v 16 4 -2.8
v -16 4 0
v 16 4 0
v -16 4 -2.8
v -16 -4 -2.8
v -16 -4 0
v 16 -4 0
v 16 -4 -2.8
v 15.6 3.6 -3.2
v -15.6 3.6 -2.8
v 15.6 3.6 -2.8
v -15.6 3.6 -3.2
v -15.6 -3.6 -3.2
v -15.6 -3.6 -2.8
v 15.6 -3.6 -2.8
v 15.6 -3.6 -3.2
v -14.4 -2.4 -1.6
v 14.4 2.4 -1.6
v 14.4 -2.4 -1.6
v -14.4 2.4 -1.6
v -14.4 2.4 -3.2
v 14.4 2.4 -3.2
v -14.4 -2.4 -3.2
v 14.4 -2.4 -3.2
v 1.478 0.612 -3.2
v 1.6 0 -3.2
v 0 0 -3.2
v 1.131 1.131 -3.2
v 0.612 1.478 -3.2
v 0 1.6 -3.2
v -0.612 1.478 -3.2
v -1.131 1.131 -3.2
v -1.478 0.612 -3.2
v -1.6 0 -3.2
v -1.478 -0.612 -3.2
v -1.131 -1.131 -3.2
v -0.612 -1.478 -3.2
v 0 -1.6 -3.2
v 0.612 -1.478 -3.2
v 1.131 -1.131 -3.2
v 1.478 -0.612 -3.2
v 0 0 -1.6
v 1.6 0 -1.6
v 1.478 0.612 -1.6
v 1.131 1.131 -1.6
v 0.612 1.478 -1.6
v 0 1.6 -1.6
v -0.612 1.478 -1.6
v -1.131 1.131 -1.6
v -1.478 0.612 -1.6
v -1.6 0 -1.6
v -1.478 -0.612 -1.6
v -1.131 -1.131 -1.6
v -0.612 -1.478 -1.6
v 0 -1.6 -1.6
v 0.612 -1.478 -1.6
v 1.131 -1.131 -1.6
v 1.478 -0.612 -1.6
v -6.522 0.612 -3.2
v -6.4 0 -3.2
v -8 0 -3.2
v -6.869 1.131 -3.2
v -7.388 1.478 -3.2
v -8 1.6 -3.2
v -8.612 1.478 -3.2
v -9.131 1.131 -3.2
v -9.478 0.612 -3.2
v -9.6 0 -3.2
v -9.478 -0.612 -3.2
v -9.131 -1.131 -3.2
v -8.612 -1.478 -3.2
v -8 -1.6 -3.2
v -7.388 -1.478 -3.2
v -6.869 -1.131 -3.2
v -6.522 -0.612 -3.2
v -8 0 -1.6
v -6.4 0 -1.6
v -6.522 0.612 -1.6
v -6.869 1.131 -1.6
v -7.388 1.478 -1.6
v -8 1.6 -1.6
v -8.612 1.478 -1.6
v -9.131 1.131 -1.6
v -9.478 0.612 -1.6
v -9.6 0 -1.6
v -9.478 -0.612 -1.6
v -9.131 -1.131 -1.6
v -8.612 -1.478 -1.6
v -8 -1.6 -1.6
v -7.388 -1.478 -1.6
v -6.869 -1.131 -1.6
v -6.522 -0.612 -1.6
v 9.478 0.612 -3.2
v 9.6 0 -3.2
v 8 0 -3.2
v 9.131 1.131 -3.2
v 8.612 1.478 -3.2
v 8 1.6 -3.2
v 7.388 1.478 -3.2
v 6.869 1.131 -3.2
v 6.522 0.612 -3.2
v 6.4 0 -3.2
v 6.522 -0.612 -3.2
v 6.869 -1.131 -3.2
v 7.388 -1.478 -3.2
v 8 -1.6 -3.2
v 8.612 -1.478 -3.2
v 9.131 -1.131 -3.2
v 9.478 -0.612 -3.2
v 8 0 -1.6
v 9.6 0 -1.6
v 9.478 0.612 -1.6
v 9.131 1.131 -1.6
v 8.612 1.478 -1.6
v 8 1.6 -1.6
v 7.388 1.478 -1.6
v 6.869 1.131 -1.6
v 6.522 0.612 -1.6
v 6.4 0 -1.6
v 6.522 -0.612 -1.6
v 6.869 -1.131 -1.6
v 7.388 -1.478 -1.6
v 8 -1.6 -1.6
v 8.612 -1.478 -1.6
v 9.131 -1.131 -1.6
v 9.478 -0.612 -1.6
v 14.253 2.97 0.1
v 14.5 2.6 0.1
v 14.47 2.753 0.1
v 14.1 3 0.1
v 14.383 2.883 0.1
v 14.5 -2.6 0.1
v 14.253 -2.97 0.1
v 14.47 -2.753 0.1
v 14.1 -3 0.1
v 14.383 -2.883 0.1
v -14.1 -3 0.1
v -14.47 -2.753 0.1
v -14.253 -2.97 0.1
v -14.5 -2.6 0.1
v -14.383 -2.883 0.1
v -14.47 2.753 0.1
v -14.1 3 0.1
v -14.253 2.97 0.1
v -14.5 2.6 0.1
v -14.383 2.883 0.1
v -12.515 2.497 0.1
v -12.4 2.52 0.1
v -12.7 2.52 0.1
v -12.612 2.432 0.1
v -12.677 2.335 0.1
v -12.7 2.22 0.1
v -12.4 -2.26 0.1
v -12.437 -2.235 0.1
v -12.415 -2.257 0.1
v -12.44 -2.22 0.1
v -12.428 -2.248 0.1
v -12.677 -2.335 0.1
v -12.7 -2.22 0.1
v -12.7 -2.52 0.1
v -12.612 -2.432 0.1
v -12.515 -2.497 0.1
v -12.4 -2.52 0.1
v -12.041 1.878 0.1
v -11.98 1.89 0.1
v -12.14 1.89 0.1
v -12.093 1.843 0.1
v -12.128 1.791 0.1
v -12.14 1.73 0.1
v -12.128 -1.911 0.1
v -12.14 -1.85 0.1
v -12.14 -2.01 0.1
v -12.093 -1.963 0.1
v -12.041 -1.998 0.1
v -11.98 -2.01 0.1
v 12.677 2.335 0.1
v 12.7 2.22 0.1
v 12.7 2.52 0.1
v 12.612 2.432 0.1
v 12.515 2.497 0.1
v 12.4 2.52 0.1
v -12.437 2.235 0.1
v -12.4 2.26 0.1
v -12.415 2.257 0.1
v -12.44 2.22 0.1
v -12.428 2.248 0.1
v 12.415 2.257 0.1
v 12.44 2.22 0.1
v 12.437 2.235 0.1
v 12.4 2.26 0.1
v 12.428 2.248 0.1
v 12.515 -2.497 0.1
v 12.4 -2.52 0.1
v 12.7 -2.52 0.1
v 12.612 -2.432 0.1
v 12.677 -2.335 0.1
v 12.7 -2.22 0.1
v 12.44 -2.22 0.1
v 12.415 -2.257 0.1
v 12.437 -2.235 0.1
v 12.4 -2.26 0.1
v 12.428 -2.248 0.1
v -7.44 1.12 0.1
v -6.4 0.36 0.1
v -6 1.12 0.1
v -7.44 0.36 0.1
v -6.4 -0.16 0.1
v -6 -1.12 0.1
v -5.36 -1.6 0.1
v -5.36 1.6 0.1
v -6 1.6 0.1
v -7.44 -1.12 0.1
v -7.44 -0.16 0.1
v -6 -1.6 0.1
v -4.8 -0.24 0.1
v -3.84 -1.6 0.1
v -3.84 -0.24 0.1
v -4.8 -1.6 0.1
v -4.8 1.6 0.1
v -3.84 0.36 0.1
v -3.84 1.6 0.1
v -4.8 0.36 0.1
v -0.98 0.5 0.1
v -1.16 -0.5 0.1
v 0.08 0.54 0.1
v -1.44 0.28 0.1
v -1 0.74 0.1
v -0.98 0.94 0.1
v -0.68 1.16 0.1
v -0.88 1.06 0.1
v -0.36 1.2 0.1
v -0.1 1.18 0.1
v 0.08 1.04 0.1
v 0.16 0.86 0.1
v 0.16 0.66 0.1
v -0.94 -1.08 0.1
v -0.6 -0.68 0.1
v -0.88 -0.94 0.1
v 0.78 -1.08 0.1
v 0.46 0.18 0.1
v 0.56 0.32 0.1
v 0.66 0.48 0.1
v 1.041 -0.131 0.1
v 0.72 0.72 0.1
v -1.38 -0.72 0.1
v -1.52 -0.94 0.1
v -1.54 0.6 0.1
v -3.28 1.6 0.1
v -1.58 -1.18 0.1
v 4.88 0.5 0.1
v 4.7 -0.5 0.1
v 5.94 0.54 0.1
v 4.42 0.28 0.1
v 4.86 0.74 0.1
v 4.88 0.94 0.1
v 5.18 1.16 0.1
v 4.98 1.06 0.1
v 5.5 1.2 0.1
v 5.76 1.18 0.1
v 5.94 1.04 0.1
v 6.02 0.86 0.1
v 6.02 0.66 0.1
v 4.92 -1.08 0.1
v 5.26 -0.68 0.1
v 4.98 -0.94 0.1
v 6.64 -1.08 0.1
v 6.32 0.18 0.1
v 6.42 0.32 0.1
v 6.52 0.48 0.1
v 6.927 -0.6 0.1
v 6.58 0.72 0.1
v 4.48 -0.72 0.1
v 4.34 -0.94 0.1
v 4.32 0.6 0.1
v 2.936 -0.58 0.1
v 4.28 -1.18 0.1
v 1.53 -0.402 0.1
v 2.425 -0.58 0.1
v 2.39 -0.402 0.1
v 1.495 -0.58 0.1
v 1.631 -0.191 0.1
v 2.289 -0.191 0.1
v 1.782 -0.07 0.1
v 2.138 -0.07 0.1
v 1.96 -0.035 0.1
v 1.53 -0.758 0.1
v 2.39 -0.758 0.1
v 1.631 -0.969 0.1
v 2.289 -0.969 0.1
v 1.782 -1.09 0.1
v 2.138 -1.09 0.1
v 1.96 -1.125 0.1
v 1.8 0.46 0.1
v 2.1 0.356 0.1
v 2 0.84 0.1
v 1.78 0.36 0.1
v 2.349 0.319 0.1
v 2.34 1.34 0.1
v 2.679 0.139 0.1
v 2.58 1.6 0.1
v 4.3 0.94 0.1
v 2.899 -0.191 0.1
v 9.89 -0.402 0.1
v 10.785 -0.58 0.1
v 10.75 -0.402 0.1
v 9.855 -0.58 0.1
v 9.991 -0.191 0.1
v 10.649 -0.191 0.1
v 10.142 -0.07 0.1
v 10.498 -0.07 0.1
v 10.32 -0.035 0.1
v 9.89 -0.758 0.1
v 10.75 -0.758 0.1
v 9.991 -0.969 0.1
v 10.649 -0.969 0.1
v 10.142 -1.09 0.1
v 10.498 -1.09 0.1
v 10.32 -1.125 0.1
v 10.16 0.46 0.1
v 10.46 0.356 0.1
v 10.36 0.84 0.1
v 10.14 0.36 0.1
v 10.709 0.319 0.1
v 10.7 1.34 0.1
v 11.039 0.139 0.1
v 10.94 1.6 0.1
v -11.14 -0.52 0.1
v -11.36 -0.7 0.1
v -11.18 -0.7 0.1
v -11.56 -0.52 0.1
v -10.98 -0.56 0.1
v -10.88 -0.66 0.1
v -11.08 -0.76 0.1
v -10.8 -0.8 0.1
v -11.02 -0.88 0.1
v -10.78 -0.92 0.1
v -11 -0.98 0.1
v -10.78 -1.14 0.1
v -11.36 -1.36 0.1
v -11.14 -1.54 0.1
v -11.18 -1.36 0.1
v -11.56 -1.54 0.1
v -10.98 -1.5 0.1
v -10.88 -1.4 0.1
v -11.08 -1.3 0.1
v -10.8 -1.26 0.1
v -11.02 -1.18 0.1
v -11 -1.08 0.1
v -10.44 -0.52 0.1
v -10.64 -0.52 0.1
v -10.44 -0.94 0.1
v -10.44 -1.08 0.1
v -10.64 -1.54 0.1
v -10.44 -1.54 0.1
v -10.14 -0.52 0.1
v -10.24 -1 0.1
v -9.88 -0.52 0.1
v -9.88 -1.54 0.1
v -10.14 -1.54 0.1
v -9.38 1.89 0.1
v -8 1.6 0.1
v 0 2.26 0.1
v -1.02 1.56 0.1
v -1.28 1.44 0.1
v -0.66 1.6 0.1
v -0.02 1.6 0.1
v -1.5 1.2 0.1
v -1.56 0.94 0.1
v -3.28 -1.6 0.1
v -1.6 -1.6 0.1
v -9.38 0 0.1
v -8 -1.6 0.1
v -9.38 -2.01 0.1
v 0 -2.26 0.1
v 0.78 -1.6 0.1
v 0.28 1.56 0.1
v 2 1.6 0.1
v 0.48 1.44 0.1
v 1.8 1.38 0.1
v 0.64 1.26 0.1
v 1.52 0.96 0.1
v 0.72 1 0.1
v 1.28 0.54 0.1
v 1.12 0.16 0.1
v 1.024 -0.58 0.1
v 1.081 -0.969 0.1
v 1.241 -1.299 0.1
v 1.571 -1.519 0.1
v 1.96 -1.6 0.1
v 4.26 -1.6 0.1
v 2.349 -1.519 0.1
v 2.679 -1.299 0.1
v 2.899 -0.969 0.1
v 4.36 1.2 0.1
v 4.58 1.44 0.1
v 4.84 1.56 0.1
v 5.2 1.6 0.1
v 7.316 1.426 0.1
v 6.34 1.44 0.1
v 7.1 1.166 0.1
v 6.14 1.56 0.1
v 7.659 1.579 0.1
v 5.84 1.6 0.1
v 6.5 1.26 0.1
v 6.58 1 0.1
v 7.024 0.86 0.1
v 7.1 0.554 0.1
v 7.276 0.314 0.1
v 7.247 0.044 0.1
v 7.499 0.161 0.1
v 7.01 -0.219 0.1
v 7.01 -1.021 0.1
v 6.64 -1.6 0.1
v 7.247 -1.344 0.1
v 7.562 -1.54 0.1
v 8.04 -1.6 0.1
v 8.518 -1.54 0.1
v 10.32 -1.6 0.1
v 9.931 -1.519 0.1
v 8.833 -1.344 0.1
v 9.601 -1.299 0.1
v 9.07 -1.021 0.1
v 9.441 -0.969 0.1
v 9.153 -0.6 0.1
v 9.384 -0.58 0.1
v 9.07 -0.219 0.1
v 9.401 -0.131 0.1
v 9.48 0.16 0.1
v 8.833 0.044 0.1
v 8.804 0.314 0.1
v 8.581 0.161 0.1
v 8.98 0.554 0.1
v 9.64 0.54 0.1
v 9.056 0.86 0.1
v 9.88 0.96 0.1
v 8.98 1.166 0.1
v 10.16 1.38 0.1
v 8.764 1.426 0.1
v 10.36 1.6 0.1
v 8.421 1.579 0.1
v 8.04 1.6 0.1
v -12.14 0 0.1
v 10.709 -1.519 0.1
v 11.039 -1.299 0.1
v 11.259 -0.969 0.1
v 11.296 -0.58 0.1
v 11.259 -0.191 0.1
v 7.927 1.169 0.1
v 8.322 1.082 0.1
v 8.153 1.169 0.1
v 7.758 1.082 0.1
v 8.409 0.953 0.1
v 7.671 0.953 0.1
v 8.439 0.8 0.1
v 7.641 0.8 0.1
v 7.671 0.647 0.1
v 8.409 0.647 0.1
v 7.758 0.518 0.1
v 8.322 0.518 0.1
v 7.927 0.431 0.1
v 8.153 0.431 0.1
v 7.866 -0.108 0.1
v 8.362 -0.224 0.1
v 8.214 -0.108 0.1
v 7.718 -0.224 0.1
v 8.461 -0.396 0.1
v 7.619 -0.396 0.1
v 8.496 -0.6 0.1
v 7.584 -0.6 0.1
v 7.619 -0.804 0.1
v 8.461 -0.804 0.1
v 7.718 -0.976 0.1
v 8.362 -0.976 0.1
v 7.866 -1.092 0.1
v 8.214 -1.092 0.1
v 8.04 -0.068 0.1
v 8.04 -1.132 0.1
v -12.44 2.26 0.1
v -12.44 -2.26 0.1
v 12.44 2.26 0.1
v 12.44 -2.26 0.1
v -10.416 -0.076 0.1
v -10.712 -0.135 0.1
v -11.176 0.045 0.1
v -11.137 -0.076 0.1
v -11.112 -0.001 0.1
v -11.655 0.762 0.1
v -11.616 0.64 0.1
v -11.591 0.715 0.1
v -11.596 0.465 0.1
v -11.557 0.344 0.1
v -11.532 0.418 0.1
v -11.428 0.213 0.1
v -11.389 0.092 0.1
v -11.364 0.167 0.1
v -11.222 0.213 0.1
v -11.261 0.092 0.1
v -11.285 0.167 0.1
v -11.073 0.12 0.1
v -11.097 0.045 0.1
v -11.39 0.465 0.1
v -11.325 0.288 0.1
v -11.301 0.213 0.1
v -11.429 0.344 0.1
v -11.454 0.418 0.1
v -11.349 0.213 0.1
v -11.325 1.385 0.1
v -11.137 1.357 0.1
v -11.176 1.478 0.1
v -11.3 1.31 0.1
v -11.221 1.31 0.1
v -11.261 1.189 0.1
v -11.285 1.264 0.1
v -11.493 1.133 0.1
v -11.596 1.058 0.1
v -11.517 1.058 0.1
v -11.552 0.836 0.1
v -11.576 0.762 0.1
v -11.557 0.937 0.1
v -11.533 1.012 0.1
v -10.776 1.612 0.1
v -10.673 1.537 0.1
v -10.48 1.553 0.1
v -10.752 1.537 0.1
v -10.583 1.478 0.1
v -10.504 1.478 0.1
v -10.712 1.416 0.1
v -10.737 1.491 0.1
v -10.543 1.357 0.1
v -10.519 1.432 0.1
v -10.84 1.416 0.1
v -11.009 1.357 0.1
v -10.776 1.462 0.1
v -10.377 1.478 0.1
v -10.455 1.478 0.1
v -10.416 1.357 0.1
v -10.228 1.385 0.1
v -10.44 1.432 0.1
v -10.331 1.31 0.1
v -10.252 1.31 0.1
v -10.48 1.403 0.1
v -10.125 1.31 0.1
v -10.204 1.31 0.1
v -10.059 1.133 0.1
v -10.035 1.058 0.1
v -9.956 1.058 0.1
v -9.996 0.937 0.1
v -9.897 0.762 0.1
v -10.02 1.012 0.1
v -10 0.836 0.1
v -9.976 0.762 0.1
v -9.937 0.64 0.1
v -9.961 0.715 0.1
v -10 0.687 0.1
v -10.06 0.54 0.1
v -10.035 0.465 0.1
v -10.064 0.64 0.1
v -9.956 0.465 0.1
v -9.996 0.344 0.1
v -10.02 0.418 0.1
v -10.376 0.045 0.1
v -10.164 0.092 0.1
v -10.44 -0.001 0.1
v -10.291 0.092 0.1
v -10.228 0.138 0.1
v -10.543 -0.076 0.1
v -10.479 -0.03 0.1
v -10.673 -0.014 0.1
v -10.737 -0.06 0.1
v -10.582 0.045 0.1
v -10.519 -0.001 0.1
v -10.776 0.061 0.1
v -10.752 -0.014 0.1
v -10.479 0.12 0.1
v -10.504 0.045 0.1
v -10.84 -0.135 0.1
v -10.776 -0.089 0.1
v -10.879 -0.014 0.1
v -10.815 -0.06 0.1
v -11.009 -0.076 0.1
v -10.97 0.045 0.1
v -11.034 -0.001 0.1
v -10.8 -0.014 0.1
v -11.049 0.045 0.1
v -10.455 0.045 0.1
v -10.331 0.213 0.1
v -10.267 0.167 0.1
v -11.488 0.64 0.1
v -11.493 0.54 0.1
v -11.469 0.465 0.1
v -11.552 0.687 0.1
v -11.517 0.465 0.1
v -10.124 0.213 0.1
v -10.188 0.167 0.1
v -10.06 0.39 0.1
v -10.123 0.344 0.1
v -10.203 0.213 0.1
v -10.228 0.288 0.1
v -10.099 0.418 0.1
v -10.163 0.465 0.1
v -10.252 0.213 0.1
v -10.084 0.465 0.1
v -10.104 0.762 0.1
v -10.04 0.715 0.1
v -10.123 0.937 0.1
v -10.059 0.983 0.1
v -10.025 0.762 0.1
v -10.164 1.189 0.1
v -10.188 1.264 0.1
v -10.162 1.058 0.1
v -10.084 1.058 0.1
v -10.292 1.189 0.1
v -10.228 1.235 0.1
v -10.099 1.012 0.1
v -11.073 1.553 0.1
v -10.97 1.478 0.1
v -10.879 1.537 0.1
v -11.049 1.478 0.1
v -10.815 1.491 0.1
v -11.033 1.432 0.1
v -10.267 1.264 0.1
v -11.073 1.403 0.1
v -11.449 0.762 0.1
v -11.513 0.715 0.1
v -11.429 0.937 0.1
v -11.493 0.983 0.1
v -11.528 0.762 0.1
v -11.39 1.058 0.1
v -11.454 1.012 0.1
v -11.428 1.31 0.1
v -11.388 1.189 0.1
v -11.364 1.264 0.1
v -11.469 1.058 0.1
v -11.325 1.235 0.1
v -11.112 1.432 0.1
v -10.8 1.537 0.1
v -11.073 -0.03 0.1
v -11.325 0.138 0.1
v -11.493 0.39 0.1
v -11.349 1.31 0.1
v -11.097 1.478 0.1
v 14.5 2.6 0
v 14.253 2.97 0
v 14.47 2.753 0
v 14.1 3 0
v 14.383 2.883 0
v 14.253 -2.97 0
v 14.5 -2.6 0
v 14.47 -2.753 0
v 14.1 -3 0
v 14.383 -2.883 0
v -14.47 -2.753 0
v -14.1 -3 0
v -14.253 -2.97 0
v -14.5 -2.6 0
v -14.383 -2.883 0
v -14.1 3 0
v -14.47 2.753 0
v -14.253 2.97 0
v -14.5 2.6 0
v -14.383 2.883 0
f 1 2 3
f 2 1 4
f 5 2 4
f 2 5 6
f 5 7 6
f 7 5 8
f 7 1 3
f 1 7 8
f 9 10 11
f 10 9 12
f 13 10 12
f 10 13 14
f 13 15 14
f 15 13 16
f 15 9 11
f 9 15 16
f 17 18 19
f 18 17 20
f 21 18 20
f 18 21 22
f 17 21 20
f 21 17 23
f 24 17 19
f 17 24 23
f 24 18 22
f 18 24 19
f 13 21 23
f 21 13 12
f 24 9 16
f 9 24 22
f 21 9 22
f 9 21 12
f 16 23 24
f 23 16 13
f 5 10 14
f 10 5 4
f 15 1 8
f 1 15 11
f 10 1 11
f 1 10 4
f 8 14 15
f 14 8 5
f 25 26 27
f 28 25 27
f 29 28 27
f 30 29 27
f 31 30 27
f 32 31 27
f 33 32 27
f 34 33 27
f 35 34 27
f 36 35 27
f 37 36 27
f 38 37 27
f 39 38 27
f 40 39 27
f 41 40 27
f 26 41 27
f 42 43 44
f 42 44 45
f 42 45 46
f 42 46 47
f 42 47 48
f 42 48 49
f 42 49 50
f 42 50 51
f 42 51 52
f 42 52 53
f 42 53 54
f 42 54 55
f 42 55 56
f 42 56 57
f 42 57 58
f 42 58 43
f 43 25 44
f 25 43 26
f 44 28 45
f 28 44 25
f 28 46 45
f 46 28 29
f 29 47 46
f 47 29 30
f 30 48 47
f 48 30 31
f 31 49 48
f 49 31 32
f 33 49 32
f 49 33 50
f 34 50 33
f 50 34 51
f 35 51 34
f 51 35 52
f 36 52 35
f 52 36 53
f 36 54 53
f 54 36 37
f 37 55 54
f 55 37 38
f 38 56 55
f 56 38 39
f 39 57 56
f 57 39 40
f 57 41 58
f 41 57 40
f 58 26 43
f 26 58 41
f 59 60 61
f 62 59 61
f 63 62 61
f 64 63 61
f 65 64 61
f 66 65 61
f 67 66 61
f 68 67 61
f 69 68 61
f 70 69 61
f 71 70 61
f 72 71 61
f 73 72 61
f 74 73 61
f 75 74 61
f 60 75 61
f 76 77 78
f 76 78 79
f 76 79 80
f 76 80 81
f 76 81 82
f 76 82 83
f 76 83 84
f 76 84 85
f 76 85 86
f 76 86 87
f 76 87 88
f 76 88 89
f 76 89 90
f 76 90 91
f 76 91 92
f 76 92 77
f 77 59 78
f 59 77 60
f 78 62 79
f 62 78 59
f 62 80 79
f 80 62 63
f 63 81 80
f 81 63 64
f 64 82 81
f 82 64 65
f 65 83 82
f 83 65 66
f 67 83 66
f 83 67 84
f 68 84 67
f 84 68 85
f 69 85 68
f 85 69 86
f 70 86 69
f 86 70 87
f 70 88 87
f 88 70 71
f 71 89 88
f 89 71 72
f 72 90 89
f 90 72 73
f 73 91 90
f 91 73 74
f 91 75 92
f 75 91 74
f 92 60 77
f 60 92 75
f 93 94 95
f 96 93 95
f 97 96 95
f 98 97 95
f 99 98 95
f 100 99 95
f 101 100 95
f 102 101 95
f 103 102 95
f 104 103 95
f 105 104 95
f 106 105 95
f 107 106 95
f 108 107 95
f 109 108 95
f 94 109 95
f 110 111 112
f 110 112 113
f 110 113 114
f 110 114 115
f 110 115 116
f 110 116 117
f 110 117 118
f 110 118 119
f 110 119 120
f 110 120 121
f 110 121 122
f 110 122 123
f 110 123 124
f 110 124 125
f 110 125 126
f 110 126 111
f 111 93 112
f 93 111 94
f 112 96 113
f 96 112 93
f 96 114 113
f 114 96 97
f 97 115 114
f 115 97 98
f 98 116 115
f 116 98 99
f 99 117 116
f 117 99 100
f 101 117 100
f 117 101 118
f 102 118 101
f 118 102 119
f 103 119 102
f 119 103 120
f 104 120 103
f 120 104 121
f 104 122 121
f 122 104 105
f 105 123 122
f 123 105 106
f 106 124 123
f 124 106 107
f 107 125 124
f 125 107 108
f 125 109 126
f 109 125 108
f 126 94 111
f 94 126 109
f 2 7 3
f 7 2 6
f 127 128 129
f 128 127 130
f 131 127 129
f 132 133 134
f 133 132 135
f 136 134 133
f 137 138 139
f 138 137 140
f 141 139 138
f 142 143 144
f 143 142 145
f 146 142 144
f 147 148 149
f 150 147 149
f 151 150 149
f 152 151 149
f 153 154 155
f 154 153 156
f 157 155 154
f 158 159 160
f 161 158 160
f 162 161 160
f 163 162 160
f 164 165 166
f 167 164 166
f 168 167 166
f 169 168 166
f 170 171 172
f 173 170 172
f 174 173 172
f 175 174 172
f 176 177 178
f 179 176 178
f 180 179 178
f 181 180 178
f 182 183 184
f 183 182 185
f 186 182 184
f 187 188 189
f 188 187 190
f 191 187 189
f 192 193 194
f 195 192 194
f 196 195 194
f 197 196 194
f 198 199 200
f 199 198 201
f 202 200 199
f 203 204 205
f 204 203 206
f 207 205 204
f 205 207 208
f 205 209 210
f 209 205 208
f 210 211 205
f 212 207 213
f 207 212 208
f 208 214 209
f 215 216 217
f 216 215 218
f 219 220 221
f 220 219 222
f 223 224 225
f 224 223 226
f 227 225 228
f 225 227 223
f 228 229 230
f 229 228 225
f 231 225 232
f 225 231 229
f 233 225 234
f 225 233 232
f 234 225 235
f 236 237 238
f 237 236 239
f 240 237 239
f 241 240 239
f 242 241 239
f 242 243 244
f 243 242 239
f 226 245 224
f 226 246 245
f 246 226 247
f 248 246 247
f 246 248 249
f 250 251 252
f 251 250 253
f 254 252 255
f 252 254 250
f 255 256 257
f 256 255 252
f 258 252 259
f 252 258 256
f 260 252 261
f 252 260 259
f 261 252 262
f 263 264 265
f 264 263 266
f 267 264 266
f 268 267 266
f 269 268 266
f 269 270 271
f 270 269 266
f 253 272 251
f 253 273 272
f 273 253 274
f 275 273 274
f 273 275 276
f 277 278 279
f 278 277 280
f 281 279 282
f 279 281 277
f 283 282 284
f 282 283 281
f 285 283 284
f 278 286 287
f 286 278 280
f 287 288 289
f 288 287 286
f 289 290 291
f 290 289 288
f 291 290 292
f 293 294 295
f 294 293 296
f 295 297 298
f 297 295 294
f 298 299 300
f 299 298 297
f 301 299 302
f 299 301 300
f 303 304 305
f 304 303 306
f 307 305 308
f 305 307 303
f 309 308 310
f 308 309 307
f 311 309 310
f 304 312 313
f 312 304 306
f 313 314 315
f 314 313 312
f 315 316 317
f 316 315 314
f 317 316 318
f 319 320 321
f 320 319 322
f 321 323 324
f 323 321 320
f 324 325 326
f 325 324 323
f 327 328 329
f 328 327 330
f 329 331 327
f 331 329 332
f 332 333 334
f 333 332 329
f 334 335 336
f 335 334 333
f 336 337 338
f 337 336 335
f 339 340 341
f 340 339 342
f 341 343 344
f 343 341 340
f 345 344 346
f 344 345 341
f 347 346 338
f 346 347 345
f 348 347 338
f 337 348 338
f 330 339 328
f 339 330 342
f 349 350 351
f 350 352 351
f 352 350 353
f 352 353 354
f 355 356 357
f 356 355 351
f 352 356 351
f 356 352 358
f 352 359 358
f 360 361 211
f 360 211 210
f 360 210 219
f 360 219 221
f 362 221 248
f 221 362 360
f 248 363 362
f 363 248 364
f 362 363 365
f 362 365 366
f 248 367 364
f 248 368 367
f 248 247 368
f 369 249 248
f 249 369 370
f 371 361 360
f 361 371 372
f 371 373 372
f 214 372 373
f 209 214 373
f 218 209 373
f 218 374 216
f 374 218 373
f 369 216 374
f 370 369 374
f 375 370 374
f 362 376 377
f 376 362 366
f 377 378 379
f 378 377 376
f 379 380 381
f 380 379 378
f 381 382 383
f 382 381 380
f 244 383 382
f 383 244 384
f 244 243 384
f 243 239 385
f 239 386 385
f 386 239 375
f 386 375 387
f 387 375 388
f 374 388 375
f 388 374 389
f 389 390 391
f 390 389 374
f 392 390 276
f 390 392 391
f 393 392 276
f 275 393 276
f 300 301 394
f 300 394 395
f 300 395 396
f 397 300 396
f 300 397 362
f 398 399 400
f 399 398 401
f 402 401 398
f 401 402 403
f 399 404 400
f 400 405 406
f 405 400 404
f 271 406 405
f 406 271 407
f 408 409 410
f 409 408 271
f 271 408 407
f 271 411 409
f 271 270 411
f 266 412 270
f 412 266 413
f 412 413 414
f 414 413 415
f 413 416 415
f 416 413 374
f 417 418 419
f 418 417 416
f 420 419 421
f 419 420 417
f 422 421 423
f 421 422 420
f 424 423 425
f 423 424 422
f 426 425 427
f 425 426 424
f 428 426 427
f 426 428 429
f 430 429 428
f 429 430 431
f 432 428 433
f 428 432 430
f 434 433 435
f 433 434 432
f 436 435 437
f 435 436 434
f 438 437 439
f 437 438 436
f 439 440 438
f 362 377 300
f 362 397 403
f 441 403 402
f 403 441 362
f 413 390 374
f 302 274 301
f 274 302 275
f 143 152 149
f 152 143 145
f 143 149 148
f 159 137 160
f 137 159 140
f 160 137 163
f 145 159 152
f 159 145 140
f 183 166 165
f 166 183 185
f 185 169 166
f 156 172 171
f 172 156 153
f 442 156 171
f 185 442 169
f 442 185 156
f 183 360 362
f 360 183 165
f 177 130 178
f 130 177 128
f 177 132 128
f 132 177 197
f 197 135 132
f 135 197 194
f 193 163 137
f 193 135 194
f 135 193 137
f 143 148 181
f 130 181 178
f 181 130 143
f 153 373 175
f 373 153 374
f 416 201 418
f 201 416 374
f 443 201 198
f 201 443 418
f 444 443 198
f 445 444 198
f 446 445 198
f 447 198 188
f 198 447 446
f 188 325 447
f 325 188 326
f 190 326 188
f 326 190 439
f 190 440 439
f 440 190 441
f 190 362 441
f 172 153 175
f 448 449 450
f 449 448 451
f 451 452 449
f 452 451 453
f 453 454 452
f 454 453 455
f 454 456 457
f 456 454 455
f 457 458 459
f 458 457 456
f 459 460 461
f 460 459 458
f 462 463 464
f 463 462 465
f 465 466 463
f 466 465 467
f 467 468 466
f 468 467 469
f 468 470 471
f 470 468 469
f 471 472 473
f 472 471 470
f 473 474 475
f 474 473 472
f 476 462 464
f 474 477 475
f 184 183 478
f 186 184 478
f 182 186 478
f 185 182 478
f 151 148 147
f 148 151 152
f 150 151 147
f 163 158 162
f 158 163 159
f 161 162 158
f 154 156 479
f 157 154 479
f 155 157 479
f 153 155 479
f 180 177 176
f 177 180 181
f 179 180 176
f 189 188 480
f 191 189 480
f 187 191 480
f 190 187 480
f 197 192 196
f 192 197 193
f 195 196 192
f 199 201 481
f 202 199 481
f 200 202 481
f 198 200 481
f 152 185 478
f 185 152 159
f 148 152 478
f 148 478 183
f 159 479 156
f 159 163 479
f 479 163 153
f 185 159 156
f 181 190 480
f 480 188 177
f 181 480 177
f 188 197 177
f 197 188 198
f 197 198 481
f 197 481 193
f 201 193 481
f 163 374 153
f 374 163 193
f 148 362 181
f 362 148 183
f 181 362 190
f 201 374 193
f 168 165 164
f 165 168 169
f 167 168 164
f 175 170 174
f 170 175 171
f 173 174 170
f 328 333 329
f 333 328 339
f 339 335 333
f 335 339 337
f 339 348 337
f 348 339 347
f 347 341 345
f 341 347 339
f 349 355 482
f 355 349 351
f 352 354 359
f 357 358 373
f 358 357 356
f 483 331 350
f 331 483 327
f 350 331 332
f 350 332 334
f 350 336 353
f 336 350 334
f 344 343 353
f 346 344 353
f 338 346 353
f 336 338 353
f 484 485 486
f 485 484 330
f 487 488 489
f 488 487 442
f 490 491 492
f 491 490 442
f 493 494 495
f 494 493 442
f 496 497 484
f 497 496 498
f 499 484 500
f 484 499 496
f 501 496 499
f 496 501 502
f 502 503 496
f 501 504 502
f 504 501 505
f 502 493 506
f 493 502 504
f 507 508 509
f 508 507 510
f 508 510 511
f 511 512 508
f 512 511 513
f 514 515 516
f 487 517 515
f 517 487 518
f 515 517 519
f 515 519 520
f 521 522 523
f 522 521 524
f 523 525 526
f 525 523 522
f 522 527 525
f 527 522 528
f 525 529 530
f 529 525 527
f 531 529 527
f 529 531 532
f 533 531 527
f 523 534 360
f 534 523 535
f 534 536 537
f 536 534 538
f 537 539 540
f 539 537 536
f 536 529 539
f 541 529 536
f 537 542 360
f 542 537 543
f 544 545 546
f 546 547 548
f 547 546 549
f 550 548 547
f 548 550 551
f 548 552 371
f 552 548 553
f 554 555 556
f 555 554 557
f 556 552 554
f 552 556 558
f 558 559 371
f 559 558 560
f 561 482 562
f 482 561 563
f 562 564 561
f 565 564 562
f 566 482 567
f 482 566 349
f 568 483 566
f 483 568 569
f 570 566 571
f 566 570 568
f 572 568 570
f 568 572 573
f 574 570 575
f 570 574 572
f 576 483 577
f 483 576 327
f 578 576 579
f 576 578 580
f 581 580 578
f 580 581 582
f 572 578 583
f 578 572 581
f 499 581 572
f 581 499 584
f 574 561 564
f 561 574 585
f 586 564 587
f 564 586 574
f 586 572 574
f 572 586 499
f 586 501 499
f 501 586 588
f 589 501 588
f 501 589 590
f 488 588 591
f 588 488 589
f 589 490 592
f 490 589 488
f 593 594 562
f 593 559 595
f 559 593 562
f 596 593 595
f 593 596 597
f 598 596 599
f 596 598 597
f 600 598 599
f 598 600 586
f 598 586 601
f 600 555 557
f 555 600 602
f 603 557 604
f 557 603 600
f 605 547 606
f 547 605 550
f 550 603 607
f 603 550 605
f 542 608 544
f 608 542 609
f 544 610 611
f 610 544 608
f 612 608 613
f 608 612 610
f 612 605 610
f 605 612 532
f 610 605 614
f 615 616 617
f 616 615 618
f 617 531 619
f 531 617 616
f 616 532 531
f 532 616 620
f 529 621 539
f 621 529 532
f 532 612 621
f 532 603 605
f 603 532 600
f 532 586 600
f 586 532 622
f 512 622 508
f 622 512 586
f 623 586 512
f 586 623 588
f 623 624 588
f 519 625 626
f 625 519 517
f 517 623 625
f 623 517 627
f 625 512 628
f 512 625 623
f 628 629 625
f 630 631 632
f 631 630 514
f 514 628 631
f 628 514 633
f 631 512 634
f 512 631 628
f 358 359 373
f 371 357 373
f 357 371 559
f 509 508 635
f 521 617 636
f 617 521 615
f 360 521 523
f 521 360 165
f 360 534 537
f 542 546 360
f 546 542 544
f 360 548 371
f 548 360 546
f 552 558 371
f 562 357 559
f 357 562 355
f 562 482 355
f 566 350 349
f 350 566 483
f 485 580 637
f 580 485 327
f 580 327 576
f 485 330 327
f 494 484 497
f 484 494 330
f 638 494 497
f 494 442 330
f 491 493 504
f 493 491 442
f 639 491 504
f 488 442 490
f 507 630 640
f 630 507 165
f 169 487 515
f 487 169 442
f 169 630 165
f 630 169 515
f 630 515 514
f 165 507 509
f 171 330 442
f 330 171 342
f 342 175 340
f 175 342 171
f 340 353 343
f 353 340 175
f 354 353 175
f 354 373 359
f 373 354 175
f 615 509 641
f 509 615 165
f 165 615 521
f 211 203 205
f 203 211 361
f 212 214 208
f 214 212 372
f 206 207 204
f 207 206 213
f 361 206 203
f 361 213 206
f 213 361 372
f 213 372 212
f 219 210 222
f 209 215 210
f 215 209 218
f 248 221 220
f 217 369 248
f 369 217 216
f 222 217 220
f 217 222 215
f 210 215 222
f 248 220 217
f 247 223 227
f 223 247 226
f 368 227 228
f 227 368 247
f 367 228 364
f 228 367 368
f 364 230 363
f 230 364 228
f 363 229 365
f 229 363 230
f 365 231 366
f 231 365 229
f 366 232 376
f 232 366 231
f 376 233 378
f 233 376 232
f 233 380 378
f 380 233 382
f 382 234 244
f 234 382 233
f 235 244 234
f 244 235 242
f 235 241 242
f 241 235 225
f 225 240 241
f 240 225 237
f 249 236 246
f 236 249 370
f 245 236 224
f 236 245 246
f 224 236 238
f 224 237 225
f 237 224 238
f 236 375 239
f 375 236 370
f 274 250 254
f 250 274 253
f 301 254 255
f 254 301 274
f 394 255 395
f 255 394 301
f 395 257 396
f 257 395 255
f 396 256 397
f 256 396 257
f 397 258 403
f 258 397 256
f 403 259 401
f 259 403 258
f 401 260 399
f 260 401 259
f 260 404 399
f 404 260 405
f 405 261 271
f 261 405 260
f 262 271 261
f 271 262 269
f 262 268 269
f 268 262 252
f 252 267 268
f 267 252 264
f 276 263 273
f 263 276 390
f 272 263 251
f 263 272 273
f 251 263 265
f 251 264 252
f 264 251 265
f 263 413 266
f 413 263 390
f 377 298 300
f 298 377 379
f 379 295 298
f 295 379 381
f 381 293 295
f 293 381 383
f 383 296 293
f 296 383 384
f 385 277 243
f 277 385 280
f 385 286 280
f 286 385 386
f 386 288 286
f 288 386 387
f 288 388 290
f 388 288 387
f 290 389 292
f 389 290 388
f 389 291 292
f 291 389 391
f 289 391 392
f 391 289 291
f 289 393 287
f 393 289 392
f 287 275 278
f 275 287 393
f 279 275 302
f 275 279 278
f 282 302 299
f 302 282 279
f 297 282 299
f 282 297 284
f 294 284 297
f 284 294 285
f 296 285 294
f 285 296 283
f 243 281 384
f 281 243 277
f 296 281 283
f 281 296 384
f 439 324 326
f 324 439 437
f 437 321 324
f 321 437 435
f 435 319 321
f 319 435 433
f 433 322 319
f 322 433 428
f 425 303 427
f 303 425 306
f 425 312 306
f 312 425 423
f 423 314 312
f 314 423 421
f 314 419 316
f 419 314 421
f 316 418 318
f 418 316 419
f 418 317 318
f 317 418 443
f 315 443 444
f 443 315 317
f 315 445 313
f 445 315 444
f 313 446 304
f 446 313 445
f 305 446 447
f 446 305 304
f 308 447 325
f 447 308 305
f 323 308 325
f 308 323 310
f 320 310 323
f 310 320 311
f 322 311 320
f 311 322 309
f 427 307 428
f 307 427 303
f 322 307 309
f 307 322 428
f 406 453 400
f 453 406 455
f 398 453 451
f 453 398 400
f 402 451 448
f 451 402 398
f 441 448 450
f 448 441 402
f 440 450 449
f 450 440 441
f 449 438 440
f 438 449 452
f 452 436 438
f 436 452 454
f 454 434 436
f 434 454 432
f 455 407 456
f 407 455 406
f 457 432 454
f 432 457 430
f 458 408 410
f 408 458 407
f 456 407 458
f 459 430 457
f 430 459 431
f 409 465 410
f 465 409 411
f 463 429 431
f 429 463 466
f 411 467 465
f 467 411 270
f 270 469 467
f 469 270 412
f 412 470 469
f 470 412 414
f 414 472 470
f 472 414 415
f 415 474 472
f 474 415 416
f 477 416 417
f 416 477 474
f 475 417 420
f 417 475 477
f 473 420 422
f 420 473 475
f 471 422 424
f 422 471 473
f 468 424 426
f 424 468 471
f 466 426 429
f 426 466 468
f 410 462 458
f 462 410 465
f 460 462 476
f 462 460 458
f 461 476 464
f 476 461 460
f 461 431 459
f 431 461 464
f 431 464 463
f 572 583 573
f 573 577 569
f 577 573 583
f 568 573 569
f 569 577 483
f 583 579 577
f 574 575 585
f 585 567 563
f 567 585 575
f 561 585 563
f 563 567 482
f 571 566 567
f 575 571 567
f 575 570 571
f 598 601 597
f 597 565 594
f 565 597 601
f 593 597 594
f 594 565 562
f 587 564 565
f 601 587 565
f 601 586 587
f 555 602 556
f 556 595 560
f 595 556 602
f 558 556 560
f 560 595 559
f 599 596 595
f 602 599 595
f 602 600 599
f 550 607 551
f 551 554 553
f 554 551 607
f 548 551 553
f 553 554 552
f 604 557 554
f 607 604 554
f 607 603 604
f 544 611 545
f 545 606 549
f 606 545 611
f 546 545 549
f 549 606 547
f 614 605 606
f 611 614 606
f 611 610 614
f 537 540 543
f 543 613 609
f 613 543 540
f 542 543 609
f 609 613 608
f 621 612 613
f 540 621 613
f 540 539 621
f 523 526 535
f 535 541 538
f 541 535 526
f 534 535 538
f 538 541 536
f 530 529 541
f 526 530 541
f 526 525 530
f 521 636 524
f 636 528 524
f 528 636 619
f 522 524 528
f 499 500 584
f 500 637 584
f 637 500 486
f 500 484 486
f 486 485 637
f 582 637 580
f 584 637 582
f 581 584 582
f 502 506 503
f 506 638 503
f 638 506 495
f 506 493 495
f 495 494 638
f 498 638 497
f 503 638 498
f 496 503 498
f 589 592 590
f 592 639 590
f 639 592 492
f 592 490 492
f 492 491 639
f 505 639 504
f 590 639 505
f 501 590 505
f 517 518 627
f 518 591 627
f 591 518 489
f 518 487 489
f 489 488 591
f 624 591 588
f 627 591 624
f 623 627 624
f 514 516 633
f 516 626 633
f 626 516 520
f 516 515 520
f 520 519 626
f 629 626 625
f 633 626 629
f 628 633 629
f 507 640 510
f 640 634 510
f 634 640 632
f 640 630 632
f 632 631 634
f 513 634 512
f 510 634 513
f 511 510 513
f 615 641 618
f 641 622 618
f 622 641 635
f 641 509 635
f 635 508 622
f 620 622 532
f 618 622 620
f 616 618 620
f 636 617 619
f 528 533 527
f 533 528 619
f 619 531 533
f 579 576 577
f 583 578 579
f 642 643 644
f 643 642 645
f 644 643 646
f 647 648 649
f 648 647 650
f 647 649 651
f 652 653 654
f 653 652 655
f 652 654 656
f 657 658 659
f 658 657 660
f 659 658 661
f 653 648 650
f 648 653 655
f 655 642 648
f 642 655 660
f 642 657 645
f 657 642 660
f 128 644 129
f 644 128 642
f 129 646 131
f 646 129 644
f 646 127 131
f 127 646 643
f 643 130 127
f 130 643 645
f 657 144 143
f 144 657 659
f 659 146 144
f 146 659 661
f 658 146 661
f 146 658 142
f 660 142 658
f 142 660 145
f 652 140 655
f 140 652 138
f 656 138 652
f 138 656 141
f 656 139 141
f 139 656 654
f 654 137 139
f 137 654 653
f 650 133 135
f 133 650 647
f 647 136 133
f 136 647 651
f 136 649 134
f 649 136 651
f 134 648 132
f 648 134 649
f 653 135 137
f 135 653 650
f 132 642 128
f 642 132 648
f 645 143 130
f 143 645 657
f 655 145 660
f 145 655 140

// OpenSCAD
use <../lib.scad>
use <2431.scad>
use <6062886f.scad>
function ldraw_lib__2431d0b() = [
// 0 Tile  1 x  4 with "EH 26 286" Danish Numberplate Sticker
// 0 Name: 2431d0b.dat
// 0 Author: Evert-Jan Boer [ejboer]
// 0 !LDRAW_ORG Shortcut UPDATE 2024-10
// 0 !LICENSE Licensed under CC BY 4.0 : see CAreadme.txt
// 
// 0 BFC CERTIFY CCW
  [0,"BFC","CERTIFY"],
  [0,"BFC","CCW"],
// 
// 0 !CATEGORY Sticker Shortcut
// 0 !KEYWORDS Bricklink 2431pb672, Mini Cooper, set 10242
// 
// 0 !HISTORY 2024-09-30 [OrionP] Official Update 2024-08
// 0 !HISTORY 2024-11-09 [MagFors] Update description
// 0 !HISTORY 2024-12-01 [OrionP] Official Update 2024-10
// 
// 1 16 0 0 0 1 0 0 0 1 0 0 0 1 2431.dat
  [1,16,0,0,0,1,0,0,0,1,0,0,0,1, ldraw_lib__2431()],
// 1 16 0 0 0 1 0 0 0 1 0 0 0 1 6062886f.dat
  [1,16,0,0,0,1,0,0,0,1,0,0,0,1, ldraw_lib__6062886f()],
];
module ldraw_lib__2431d0b(step=0, col=false, unit=2/5, alt=false, line=0.2, solid=!$preview)
    makepoly(ldraw_lib__2431d0b(), step=step, col=col, unit=unit, alt=alt, line=line, solid=solid);
ldraw_lib__2431d0b(line=0.2);
